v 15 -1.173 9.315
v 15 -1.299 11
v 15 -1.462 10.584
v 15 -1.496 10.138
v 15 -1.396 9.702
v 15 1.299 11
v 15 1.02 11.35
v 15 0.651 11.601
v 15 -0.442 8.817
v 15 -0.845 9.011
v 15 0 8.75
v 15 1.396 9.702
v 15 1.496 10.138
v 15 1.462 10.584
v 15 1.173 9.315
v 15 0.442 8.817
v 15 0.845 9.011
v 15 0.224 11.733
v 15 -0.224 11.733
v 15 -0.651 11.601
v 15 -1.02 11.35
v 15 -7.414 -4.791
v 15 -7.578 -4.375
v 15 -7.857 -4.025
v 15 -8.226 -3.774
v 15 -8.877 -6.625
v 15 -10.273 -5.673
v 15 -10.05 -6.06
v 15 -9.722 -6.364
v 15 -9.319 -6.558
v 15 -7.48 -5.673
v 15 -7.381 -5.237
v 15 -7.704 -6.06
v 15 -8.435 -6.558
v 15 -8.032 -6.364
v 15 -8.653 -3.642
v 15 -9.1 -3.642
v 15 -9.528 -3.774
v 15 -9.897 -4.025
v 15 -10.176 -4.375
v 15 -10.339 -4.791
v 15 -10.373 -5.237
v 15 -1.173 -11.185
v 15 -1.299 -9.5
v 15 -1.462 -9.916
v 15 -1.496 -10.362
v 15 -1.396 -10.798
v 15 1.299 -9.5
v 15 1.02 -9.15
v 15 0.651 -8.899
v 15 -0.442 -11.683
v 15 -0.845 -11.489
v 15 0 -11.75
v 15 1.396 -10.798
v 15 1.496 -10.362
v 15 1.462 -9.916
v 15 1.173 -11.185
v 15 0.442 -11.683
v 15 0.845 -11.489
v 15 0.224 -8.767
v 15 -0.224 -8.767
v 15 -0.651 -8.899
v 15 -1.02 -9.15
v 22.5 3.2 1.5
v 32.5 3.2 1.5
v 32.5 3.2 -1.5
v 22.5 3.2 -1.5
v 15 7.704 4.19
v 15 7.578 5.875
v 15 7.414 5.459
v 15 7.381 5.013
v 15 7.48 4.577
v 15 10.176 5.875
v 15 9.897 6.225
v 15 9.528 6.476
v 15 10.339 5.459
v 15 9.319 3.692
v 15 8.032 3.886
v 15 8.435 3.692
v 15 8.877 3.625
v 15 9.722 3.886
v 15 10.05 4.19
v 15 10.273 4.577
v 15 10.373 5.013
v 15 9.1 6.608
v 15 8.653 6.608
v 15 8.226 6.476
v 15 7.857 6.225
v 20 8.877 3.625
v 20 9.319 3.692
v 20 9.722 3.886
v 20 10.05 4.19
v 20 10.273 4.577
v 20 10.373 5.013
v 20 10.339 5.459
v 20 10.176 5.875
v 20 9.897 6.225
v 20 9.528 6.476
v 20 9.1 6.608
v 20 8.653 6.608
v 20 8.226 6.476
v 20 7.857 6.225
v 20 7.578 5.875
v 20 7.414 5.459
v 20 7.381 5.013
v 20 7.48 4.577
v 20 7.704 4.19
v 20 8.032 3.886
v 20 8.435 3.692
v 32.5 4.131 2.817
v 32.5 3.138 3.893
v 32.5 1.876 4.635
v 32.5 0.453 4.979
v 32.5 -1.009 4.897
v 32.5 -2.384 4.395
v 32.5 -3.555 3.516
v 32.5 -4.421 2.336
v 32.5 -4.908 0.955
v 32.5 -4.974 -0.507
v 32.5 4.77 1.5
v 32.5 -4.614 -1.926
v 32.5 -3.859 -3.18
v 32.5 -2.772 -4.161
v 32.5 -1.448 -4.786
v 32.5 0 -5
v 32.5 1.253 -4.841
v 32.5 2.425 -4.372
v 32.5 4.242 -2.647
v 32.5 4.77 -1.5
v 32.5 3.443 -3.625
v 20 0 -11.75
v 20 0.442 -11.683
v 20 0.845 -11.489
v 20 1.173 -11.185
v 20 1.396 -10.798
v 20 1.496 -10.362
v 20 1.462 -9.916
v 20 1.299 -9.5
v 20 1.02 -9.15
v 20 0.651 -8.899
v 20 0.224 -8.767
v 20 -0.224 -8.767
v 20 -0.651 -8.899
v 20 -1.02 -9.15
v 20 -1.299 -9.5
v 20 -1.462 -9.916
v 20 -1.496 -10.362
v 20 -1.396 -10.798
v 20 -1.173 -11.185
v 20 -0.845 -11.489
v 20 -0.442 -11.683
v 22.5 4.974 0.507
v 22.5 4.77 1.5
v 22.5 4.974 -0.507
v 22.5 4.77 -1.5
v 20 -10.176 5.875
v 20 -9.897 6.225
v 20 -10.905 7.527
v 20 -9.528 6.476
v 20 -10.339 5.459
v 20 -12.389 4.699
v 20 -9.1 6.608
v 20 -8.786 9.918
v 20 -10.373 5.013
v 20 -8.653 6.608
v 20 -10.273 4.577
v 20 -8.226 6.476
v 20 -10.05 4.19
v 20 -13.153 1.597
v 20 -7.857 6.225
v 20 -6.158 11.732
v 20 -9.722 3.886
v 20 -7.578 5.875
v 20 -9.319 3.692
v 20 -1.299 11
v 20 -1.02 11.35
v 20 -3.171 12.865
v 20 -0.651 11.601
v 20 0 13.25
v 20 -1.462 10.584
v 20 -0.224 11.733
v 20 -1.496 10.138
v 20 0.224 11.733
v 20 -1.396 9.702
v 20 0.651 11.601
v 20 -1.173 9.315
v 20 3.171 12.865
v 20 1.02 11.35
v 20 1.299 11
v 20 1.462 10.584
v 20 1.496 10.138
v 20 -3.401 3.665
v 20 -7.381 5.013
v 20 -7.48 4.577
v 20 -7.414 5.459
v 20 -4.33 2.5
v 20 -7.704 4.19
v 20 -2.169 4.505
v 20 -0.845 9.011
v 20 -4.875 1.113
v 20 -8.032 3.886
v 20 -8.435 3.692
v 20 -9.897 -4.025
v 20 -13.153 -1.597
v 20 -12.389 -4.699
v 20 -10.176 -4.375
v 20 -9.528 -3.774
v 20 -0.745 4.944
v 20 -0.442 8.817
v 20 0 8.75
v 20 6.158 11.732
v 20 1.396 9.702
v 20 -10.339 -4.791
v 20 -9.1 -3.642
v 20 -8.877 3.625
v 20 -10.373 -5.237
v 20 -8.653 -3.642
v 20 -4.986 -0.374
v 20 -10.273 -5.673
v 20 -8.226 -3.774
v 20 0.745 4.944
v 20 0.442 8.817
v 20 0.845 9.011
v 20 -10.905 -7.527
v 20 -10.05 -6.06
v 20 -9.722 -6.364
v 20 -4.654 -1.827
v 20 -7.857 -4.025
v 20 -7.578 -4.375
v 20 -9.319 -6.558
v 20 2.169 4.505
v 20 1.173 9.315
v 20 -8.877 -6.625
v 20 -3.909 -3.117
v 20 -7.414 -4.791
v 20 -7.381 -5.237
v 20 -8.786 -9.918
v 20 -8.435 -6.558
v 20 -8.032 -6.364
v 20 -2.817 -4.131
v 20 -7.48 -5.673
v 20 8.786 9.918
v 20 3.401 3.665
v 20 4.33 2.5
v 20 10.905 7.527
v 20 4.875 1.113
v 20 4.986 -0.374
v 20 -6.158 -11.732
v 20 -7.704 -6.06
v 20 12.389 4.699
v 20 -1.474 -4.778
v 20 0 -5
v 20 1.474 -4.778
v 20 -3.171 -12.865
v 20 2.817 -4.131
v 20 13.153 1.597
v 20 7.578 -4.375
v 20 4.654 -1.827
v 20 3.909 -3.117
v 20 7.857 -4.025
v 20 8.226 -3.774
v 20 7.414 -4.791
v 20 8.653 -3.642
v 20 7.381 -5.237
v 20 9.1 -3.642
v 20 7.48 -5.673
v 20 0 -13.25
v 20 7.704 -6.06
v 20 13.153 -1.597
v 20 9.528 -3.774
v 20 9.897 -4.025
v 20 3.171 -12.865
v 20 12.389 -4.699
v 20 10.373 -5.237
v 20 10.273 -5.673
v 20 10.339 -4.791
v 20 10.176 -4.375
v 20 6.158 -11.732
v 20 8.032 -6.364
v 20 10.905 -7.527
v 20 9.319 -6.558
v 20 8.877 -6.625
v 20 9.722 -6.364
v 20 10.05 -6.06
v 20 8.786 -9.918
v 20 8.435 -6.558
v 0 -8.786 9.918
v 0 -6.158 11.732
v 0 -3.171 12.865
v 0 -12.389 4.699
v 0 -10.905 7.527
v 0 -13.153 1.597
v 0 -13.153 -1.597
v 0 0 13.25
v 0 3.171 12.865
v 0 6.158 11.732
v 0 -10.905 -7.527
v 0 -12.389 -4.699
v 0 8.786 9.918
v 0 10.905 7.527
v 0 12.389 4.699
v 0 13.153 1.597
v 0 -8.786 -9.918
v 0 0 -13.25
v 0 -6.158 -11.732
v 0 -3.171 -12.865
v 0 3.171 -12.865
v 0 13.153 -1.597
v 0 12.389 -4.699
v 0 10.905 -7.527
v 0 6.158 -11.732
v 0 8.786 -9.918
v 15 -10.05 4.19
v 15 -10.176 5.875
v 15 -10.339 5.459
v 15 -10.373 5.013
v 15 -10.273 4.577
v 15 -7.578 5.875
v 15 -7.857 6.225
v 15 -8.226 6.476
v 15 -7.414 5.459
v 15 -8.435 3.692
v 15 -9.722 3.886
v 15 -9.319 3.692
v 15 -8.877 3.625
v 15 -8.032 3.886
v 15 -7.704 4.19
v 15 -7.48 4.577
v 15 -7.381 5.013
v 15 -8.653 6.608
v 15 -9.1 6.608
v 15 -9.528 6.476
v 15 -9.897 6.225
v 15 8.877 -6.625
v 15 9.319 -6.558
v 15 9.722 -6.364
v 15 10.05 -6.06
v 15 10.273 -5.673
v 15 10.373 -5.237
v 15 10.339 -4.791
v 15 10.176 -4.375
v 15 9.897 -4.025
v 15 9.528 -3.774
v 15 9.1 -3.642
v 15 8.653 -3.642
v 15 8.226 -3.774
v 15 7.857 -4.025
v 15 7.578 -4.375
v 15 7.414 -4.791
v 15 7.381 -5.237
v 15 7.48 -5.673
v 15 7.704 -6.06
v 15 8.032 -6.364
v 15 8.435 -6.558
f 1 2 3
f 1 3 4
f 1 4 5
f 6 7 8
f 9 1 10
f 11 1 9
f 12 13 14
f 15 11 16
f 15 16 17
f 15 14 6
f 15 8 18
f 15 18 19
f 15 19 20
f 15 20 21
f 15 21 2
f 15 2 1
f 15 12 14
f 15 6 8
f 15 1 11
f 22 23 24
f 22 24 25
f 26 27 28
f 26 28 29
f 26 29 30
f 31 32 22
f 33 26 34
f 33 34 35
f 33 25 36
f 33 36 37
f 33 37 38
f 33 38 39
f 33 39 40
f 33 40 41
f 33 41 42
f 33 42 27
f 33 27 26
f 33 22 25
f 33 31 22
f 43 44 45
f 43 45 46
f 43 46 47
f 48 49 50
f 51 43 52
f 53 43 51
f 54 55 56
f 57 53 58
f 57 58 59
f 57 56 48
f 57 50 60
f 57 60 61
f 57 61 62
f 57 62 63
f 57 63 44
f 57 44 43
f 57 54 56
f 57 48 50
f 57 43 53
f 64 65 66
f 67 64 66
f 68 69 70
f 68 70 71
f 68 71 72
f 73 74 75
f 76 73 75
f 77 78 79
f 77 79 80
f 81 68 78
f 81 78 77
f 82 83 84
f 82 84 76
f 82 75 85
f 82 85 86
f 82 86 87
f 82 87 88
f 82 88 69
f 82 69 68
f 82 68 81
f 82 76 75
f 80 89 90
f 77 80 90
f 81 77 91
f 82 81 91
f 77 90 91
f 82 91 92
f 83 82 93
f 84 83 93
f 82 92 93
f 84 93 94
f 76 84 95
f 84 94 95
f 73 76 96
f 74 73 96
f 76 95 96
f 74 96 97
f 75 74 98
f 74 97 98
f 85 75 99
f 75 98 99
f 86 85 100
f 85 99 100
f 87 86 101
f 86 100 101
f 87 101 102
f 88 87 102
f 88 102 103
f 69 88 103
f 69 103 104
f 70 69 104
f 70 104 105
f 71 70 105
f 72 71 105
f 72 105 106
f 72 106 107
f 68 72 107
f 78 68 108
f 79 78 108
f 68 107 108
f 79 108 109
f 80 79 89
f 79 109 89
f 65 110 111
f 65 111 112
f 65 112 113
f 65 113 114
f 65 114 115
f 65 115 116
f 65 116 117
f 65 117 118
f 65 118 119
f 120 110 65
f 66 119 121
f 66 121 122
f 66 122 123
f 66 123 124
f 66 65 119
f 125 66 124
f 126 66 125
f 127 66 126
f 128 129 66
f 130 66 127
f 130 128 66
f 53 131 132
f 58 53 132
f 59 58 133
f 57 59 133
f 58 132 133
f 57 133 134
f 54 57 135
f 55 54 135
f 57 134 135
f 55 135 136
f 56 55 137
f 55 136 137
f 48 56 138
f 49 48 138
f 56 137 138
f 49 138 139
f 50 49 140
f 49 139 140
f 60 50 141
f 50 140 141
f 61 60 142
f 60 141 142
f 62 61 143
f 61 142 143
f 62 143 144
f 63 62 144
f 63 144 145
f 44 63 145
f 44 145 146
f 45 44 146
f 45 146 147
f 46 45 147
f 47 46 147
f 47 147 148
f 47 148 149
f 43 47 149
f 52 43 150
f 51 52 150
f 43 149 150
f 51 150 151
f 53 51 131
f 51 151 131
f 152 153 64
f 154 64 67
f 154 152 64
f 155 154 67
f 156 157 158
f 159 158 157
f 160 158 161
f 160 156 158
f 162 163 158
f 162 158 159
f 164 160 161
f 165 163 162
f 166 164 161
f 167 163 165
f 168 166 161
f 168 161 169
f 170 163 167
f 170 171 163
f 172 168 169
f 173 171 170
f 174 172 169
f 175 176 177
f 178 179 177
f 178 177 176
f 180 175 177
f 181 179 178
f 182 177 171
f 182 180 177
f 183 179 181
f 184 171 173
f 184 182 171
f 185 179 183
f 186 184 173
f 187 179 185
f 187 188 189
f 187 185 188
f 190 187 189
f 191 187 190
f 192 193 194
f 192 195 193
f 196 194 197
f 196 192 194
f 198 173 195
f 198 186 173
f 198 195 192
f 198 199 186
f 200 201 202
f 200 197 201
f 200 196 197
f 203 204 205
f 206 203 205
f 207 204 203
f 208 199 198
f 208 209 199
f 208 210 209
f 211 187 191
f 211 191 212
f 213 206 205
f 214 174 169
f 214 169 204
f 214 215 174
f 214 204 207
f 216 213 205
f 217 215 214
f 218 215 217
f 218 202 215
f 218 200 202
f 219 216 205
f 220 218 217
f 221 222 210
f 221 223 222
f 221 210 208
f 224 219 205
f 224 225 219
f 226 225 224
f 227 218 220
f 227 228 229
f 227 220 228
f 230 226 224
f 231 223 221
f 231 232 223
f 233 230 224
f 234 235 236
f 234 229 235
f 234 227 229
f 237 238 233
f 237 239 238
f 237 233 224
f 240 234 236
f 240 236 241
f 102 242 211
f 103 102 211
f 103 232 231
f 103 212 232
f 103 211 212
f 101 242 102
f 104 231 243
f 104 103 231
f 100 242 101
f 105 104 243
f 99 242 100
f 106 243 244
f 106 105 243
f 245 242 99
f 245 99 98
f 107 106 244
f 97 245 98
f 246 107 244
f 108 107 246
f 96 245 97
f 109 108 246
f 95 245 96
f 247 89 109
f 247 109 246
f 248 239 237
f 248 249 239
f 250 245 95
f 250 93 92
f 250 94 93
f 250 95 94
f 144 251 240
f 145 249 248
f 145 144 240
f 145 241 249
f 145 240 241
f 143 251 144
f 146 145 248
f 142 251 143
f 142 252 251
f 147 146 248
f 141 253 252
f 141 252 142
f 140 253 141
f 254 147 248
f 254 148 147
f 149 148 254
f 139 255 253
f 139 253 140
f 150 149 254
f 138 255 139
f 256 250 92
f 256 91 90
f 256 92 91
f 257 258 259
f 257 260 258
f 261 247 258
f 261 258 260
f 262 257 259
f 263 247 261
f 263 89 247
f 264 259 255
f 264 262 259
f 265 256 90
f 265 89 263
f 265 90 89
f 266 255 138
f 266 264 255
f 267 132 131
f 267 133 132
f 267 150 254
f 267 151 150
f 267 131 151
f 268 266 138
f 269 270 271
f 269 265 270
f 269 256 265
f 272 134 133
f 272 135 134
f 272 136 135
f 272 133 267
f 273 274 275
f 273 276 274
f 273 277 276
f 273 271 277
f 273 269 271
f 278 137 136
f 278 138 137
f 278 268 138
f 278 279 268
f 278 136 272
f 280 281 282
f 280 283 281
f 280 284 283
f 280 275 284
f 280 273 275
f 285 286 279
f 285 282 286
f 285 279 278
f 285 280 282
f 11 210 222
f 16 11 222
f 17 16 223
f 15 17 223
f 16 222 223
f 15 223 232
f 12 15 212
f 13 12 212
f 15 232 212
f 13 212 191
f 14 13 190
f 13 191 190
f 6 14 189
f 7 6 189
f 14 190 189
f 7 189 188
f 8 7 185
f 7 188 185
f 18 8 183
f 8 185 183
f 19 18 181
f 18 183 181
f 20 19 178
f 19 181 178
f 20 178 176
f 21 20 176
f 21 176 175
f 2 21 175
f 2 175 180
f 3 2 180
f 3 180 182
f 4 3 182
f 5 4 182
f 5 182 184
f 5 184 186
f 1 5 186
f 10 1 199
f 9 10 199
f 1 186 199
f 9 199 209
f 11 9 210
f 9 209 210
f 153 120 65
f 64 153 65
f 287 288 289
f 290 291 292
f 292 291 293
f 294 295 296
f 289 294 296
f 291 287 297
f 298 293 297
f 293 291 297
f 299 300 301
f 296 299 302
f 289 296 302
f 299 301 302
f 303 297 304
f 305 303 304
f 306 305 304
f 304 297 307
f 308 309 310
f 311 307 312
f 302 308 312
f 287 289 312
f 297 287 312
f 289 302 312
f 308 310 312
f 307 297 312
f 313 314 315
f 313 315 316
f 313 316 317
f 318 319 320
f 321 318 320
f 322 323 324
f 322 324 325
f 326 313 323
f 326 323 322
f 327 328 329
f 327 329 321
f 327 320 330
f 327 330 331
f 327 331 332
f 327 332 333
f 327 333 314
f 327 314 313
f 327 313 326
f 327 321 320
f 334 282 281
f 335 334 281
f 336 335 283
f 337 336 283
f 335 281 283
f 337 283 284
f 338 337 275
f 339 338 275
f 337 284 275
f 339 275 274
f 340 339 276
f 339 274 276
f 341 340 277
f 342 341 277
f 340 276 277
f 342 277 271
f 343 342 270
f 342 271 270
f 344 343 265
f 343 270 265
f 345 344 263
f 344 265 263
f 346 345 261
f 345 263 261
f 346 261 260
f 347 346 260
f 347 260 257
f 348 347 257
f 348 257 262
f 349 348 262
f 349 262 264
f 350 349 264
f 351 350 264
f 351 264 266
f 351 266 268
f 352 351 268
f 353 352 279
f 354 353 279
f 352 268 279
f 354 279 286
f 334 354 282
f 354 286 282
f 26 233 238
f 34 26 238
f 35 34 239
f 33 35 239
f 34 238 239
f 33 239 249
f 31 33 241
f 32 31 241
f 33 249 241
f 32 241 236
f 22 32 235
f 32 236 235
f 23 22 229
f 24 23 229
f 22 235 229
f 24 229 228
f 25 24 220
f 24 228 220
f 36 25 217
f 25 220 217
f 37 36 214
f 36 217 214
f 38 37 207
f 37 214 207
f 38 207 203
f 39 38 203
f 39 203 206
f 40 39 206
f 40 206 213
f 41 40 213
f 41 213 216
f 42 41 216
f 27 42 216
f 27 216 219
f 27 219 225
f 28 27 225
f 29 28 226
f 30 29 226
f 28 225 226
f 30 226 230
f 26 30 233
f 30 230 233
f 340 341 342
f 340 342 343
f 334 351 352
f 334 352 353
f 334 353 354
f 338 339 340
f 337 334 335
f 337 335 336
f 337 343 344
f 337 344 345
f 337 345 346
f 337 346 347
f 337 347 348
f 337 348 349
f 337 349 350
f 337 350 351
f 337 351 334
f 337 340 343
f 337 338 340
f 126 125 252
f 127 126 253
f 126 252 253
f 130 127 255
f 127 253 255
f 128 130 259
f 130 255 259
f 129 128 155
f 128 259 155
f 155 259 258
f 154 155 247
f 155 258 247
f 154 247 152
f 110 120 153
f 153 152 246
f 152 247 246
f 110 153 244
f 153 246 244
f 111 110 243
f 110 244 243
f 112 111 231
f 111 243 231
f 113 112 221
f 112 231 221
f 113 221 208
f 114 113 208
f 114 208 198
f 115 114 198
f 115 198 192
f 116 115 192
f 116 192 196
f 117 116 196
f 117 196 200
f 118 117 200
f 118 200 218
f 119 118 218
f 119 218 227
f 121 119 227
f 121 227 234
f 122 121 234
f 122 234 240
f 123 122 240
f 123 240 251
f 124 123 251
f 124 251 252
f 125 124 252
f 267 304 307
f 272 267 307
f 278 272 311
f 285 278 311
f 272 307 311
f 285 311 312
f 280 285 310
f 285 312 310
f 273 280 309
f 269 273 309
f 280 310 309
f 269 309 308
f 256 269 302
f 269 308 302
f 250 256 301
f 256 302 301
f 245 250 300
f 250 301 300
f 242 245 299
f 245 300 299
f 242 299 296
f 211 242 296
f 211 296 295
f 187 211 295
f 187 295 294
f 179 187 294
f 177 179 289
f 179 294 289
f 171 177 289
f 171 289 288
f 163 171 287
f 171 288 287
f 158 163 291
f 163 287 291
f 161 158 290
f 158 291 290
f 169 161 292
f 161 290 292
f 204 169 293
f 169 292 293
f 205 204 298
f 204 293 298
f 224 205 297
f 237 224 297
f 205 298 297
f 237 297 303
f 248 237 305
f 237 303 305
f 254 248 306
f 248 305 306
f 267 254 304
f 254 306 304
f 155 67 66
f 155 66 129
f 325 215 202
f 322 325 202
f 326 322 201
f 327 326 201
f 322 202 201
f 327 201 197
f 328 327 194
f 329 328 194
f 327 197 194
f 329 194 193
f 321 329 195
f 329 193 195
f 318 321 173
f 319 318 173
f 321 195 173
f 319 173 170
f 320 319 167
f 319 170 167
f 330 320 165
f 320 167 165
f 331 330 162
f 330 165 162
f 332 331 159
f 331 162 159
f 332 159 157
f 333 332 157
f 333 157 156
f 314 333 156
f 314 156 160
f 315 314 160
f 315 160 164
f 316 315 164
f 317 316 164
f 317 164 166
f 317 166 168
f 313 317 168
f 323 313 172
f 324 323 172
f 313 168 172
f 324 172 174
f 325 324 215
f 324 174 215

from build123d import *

# Parameters (mm, degrees)
SKETCH_1_R          = 13.25
EXTRUDE_1_DEPTH     = 20
SKETCH_2_R          = 1.5
CUT_EXTRUDE_1_DEPTH = 5
SKETCH_3_R          = 5
EXTRUDE_2_DEPTH     = 12.5
CUT_EXTRUDE_START   = -10
CUT_EXTRUDE_2_DEPTH = 10


with BuildPart() as part:
    # 草图1 → 凸台-拉伸1 (new body)
    with BuildSketch(Plane(origin=(0, 0, 0), x_dir=(0, 0, -1), z_dir=(1, 0, 0))):
        Circle(SKETCH_1_R)
    extrude(amount=EXTRUDE_1_DEPTH)

    # 草图2 → 切除-拉伸1 (cut)
    with BuildSketch(Plane(origin=(20, 0, 0), x_dir=(0, 0, -1), z_dir=(1, 0, 0))):
        with Locations((10.25, 0)):
            Circle(SKETCH_2_R)
        with Locations((5.125, -8.876760389)):
            Circle(SKETCH_2_R)
        with Locations((-5.125, -8.876760389)):
            Circle(SKETCH_2_R)
        with Locations((-10.25, 0)):
            Circle(SKETCH_2_R)
        with Locations((-5.125, 8.876760389)):
            Circle(SKETCH_2_R)
        with Locations((5.125, 8.876760389)):
            Circle(SKETCH_2_R)
    extrude(amount=-CUT_EXTRUDE_1_DEPTH, mode=Mode.SUBTRACT)

    # 草图3 → 凸台-拉伸2 (add)
    with BuildSketch(Plane(origin=(20, 0, 0), x_dir=(0, 0, -1), z_dir=(1, 0, 0))):
        Circle(SKETCH_3_R)
    extrude(amount=EXTRUDE_2_DEPTH)

    # 草图4 → 切除-拉伸2 (cut)
    with BuildSketch(Plane(origin=(32.5, 0, 0), x_dir=(0, 0, -1), z_dir=(1, 0, 0)).offset(CUT_EXTRUDE_START)):
        with BuildLine():
            Line((-1.5, 3.2), (1.5, 3.2))
            Line((1.5, 3.2), (1.5, 4.769696007))
            ThreePointArc((1.5, 4.769696007), (0, 5), (-1.5, 4.769696007))
            Line((-1.5, 4.769696007), (-1.5, 3.2))
        make_face()
    extrude(amount=CUT_EXTRUDE_2_DEPTH, mode=Mode.SUBTRACT)


solid = part.part
